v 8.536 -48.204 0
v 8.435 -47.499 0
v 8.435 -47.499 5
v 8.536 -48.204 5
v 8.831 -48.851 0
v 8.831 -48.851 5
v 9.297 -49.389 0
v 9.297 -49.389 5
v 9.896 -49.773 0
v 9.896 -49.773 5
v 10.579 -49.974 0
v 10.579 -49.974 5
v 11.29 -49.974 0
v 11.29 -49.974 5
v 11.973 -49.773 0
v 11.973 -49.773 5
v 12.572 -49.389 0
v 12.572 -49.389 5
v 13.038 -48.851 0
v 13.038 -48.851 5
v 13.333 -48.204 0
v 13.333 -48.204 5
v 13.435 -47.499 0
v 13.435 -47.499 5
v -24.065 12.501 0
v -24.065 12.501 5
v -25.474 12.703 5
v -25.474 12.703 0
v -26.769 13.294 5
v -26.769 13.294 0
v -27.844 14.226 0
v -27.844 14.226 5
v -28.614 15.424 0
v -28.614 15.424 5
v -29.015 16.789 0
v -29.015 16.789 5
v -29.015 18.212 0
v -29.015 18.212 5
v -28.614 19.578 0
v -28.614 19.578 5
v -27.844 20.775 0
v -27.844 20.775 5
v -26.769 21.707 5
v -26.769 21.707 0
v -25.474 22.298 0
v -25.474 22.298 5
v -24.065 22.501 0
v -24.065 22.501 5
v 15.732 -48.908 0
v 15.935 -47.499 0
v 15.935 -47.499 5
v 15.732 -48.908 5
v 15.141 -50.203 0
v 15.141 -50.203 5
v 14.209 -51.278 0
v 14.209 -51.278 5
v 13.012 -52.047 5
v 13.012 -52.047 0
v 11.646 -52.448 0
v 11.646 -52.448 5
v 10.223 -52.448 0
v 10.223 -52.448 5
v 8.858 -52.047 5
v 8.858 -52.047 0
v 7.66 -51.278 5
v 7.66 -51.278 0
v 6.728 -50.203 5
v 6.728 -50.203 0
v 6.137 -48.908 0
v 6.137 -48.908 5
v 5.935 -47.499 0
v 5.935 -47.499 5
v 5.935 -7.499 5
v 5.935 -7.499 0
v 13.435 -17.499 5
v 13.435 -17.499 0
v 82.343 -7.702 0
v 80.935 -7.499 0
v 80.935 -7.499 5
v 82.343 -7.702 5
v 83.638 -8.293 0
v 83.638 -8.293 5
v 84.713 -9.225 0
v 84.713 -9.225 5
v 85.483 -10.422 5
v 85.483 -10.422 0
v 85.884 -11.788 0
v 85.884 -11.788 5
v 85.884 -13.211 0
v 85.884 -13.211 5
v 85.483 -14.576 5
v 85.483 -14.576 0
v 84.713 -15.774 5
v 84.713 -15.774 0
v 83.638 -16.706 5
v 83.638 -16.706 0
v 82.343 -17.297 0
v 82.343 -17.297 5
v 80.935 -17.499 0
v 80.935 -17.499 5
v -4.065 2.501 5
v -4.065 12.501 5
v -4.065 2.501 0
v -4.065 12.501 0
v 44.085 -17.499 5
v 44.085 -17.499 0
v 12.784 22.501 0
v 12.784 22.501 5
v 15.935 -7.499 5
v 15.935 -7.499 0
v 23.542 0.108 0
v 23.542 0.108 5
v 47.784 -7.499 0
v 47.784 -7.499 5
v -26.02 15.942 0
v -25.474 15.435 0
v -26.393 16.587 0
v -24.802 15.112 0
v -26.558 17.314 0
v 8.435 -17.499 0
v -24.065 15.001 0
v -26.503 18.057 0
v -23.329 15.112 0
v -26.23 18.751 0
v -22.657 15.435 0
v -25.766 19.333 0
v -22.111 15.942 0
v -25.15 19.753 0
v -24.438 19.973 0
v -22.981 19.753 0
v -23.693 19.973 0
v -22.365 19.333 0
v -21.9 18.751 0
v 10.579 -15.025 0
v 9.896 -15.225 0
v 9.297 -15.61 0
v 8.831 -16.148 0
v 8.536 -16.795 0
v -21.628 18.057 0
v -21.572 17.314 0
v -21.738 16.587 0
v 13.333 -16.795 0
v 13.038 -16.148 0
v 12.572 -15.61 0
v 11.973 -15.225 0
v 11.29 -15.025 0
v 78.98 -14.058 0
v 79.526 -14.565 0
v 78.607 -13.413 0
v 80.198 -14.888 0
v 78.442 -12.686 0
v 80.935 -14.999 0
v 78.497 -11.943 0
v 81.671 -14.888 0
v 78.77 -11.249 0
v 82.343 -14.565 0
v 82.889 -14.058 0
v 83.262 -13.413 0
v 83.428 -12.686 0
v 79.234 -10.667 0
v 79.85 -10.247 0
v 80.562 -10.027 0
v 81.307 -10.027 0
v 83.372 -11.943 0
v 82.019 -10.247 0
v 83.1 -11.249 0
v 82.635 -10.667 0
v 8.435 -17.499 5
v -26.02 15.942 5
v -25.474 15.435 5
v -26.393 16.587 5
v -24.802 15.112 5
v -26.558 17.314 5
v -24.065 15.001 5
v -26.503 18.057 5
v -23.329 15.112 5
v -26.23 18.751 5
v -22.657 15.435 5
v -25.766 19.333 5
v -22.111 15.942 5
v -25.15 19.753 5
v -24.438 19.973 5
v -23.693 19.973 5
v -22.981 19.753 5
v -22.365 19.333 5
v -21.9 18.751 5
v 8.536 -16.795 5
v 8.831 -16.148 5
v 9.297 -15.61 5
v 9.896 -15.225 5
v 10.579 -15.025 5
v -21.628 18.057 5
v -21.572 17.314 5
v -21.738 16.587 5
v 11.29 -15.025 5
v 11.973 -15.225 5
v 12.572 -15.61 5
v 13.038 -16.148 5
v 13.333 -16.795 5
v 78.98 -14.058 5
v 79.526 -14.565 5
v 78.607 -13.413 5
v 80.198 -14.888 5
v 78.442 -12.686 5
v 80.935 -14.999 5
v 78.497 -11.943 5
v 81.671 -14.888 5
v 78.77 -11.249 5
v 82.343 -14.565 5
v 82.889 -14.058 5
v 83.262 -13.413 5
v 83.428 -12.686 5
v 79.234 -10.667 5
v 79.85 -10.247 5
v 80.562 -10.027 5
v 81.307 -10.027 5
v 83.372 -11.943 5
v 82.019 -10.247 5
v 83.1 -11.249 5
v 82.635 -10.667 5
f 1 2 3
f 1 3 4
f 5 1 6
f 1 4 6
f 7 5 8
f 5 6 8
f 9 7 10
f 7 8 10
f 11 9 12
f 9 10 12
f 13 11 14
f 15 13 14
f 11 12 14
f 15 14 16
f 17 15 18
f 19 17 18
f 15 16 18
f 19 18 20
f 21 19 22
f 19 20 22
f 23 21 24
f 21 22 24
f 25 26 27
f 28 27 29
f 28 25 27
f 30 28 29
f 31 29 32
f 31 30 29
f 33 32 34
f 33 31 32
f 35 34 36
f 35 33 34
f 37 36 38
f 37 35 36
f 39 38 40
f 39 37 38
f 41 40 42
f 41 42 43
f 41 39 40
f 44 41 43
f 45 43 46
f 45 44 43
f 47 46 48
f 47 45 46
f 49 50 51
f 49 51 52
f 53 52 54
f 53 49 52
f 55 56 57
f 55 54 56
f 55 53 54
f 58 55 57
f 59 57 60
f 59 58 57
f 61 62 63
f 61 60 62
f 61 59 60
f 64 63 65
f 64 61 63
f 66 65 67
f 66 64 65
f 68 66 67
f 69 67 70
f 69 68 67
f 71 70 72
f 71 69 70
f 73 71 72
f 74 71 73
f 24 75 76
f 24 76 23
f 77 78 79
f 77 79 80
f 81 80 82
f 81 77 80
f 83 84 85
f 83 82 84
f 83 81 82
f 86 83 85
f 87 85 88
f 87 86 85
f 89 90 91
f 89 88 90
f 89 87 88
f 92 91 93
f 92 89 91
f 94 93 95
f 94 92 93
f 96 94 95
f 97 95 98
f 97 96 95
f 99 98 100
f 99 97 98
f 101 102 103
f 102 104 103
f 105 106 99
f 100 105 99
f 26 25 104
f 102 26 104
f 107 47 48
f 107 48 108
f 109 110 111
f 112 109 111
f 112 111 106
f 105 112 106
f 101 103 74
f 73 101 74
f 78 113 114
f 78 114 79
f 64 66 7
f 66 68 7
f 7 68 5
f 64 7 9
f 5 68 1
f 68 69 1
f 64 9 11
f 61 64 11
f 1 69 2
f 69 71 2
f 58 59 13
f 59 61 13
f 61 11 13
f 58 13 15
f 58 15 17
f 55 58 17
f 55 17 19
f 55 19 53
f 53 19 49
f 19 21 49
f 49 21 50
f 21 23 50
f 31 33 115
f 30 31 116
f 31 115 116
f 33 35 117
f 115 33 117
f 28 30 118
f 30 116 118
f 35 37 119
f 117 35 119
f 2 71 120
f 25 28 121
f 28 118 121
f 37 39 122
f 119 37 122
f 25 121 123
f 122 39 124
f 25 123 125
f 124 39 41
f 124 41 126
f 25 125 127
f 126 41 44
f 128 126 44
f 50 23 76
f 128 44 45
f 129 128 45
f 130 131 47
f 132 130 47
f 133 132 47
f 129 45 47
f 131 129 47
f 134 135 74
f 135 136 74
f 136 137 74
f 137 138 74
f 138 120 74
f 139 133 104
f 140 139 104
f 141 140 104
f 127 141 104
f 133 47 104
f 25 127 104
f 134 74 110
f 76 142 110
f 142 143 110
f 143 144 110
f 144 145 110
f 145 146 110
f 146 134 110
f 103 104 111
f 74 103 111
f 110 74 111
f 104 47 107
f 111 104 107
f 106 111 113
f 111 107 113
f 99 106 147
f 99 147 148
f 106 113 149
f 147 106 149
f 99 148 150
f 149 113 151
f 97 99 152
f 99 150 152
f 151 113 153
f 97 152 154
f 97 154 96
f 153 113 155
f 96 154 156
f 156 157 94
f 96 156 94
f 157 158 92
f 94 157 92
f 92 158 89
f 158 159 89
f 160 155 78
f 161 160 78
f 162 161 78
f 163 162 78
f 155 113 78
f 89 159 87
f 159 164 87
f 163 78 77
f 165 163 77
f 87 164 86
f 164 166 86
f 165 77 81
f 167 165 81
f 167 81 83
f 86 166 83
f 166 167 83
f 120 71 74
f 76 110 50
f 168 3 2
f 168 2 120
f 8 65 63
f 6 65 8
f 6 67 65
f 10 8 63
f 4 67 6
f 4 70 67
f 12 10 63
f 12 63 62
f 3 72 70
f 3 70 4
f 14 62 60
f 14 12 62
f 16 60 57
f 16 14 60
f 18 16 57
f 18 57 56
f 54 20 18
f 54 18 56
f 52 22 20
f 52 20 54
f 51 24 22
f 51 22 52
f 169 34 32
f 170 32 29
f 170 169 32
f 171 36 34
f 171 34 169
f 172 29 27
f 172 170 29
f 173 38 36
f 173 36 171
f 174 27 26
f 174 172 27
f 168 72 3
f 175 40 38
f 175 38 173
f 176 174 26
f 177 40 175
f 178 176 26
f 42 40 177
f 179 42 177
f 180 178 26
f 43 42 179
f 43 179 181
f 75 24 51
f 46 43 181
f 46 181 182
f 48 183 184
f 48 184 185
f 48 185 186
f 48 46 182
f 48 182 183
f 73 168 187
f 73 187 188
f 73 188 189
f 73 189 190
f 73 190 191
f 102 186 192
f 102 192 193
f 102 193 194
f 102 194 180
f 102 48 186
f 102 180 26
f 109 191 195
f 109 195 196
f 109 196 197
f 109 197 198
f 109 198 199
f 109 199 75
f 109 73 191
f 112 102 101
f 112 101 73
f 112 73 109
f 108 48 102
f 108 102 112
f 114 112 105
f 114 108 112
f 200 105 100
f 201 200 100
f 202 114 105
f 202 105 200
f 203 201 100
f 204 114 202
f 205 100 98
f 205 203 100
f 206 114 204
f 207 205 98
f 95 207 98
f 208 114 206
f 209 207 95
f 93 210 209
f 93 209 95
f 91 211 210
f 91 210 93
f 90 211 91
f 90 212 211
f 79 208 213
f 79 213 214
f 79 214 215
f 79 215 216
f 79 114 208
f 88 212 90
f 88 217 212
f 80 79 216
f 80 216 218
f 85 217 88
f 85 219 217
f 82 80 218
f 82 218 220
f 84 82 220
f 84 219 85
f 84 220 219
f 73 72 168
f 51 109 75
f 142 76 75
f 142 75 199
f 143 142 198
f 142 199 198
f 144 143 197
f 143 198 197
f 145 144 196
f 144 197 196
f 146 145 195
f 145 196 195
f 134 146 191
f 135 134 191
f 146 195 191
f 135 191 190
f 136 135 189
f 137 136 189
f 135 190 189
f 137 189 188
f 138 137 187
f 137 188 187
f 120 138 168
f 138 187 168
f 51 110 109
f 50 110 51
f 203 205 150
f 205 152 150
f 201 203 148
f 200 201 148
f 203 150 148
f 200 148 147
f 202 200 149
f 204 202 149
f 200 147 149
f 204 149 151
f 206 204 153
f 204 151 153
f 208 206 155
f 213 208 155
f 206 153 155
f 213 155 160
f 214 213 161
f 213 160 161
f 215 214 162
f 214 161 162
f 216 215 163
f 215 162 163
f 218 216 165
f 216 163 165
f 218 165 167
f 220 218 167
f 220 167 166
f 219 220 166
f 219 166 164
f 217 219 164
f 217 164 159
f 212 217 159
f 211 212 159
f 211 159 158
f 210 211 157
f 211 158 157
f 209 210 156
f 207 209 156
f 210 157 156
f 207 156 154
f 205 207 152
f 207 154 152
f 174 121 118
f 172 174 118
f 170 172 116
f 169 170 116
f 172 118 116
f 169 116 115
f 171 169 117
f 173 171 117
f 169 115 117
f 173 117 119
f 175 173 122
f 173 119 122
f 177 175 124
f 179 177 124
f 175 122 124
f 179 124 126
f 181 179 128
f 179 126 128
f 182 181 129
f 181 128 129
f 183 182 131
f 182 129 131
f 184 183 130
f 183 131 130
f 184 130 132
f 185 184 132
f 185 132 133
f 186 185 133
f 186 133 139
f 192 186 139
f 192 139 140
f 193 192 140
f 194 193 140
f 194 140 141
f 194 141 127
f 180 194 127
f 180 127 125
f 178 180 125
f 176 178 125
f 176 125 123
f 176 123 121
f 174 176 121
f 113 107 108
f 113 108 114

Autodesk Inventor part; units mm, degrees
ref_plane "YZ Plane" through (0, 0, 0) normal (1, 0, 0) x (0, 1, 0)
ref_plane "XZ Plane" through (0, 0, 0) normal (0, 1, 0) x (-1, 0, 0)
ref_plane "XY Plane" through (0, 0, 0) normal (0, 0, 1) x (1, 0, 0)
sketch "Sketch1" plane through (0, 0, 0) normal (0, 0, 1) x (1, 0, 0)
  line L0 (-24.0654, 17.5007) -> (10.9346, 17.5007) construction
  line L1 (45.9346, -12.4993) -> (80.9346, -12.4993) construction
  line L2 (10.9346, 17.5007) -> (45.9346, -12.4993) construction
  line L3 (-24.0654, 22.5007) -> (12.7842, 22.5007)
  line L4 (12.7842, 22.5007) -> (47.7842, -7.4993)
  line L5 (47.7842, -7.4993) -> (80.9346, -7.4993)
  line L6 (-24.0654, 12.5007) -> (-4.0654, 12.5007)
  line L7 (44.085, -17.4993) -> (80.9346, -17.4993)
  line L8 (10.9346, 17.5007) -> (10.9346, -47.4993) construction
  line L9 (15.9346, -7.4993) -> (15.9346, -47.4993)
  line L10 (22.4168, 1.0734) -> (44.085, -17.4993)
  arc A0 (-29.0654, 17.5007) -> (-24.0654, 12.5007) centre (-24.0654, 17.5007) ccw
  arc A1 (-24.0654, 22.5007) -> (-29.0654, 17.5007) centre (-24.0654, 17.5007) ccw
  arc A2 (85.9346, -12.4993) -> (80.9346, -7.4993) centre (80.9346, -12.4993) ccw
  arc A3 (80.9346, -17.4993) -> (85.9346, -12.4993) centre (80.9346, -12.4993) ccw
  arc A4 (10.9346, -52.4993) -> (15.9346, -47.4993) centre (10.9346, -47.4993) ccw
  arc A5 (5.9346, -47.4993) -> (10.9346, -52.4993) centre (10.9346, -47.4993) ccw
  line L11 (-4.0654, 12.5007) -> (-4.0654, 2.5007)
  line L12 (5.9346, -7.4993) -> (5.9346, -7.4993)
  line L13 (-4.0654, 2.5007) -> (5.9346, -7.4993)
  line L14 (15.9346, -7.4993) -> (23.5424, 0.1085)
  line L15 (5.9346, -47.4993) -> (5.9346, -7.4993)
  point P0 (0, 0)
  point P1 (-29.0654, 17.5007)
  point P2 (-4.0654, -7.4993)
  dimension "d0" = 35
  dimension "d4" = 35
  dimension "d5" = 35
  dimension "d6" = 30
  dimension "d7" = 5
  dimension "d8" = 5
  dimension "d10" = 5
  dimension "d11" = 5
  dimension "d13" = 65
  dimension "d14" = 5
  dimension "d15" = 5
  dimension "d16" = 5
  dimension "d34" = 5
  dimension "d35" = 5
  dimension "d36" = 5
  dimension "d37" = 5
  dimension "d41" = 20
  dimension "d43" = 10
  dimension "d44" = 10
  dimension "d47" = 135
extrude "Cuerpo" add sketch "Sketch1" along normal blind 5
sketch "Sketch2" plane through (0, 0, 5) normal (0, 0, 1) x (1, 0, 0)
  arc A0 (-24.0654, 22.5007) -> (-24.0654, 12.5007) centre (-24.0654, 17.5007) ccw projected
  arc A1 (80.9346, -17.4993) -> (80.9346, -7.4993) centre (80.9346, -12.4993) ccw projected
  point P0 (0, 0)
hole "Hole1" at (-24.0654, 17.5007, 5) at (80.9346, -12.4993, 5) direction (0, 0, -1) diameter 5 end through all
sketch "Sketch3" plane through (0, 0, 5) normal (0, 0, 1) x (1, 0, 0)
  arc A0 (5.9346, -47.4993) -> (15.9346, -47.4993) centre (10.9346, -47.4993) ccw construction
  line L0 (10.9346, -47.4993) -> (10.9346, -17.4993) construction
  line L1 (10.9346, -14.9993) -> (10.9346, -14.9993)
  line L2 (13.4346, -17.4993) -> (13.4346, -47.4993)
  line L3 (10.9346, -49.9993) -> (10.9346, -49.9993)
  line L4 (8.4346, -47.4993) -> (8.4346, -17.4993)
  arc A1 (10.9346, -14.9993) -> (8.4346, -17.4993) centre (10.9346, -17.4993) ccw
  arc A2 (13.4346, -17.4993) -> (10.9346, -14.9993) centre (10.9346, -17.4993) ccw
  arc A3 (8.4346, -47.4993) -> (10.9346, -49.9993) centre (10.9346, -47.4993) ccw
  arc A4 (10.9346, -49.9993) -> (13.4346, -47.4993) centre (10.9346, -47.4993) ccw
  point P0 (0, 0)
  point P1 (10.9346, -14.9993)
  point P2 (10.9346, -49.9993)
  dimension "d26" = 30
  dimension "d28" = 2.5
  dimension "d29" = 2.5
  dimension "d30" = 2.5
  dimension "d31" = 2.5
extrude "Ranura" cut sketch "Sketch3" against normal blind 5
sketch "Sketch4" plane through (0, 0, 5) normal (0, 0, 1) x (1, 0, 0)
  circle A0 centre (10.0854, 7.229) radius 12.5 construction
  point P0 (0, 0)
  dimension "d38" = 25
equation "\"d44\" = d43"
properties part number "BrazoV2" material "MDF Medium Density Fiberboard"
